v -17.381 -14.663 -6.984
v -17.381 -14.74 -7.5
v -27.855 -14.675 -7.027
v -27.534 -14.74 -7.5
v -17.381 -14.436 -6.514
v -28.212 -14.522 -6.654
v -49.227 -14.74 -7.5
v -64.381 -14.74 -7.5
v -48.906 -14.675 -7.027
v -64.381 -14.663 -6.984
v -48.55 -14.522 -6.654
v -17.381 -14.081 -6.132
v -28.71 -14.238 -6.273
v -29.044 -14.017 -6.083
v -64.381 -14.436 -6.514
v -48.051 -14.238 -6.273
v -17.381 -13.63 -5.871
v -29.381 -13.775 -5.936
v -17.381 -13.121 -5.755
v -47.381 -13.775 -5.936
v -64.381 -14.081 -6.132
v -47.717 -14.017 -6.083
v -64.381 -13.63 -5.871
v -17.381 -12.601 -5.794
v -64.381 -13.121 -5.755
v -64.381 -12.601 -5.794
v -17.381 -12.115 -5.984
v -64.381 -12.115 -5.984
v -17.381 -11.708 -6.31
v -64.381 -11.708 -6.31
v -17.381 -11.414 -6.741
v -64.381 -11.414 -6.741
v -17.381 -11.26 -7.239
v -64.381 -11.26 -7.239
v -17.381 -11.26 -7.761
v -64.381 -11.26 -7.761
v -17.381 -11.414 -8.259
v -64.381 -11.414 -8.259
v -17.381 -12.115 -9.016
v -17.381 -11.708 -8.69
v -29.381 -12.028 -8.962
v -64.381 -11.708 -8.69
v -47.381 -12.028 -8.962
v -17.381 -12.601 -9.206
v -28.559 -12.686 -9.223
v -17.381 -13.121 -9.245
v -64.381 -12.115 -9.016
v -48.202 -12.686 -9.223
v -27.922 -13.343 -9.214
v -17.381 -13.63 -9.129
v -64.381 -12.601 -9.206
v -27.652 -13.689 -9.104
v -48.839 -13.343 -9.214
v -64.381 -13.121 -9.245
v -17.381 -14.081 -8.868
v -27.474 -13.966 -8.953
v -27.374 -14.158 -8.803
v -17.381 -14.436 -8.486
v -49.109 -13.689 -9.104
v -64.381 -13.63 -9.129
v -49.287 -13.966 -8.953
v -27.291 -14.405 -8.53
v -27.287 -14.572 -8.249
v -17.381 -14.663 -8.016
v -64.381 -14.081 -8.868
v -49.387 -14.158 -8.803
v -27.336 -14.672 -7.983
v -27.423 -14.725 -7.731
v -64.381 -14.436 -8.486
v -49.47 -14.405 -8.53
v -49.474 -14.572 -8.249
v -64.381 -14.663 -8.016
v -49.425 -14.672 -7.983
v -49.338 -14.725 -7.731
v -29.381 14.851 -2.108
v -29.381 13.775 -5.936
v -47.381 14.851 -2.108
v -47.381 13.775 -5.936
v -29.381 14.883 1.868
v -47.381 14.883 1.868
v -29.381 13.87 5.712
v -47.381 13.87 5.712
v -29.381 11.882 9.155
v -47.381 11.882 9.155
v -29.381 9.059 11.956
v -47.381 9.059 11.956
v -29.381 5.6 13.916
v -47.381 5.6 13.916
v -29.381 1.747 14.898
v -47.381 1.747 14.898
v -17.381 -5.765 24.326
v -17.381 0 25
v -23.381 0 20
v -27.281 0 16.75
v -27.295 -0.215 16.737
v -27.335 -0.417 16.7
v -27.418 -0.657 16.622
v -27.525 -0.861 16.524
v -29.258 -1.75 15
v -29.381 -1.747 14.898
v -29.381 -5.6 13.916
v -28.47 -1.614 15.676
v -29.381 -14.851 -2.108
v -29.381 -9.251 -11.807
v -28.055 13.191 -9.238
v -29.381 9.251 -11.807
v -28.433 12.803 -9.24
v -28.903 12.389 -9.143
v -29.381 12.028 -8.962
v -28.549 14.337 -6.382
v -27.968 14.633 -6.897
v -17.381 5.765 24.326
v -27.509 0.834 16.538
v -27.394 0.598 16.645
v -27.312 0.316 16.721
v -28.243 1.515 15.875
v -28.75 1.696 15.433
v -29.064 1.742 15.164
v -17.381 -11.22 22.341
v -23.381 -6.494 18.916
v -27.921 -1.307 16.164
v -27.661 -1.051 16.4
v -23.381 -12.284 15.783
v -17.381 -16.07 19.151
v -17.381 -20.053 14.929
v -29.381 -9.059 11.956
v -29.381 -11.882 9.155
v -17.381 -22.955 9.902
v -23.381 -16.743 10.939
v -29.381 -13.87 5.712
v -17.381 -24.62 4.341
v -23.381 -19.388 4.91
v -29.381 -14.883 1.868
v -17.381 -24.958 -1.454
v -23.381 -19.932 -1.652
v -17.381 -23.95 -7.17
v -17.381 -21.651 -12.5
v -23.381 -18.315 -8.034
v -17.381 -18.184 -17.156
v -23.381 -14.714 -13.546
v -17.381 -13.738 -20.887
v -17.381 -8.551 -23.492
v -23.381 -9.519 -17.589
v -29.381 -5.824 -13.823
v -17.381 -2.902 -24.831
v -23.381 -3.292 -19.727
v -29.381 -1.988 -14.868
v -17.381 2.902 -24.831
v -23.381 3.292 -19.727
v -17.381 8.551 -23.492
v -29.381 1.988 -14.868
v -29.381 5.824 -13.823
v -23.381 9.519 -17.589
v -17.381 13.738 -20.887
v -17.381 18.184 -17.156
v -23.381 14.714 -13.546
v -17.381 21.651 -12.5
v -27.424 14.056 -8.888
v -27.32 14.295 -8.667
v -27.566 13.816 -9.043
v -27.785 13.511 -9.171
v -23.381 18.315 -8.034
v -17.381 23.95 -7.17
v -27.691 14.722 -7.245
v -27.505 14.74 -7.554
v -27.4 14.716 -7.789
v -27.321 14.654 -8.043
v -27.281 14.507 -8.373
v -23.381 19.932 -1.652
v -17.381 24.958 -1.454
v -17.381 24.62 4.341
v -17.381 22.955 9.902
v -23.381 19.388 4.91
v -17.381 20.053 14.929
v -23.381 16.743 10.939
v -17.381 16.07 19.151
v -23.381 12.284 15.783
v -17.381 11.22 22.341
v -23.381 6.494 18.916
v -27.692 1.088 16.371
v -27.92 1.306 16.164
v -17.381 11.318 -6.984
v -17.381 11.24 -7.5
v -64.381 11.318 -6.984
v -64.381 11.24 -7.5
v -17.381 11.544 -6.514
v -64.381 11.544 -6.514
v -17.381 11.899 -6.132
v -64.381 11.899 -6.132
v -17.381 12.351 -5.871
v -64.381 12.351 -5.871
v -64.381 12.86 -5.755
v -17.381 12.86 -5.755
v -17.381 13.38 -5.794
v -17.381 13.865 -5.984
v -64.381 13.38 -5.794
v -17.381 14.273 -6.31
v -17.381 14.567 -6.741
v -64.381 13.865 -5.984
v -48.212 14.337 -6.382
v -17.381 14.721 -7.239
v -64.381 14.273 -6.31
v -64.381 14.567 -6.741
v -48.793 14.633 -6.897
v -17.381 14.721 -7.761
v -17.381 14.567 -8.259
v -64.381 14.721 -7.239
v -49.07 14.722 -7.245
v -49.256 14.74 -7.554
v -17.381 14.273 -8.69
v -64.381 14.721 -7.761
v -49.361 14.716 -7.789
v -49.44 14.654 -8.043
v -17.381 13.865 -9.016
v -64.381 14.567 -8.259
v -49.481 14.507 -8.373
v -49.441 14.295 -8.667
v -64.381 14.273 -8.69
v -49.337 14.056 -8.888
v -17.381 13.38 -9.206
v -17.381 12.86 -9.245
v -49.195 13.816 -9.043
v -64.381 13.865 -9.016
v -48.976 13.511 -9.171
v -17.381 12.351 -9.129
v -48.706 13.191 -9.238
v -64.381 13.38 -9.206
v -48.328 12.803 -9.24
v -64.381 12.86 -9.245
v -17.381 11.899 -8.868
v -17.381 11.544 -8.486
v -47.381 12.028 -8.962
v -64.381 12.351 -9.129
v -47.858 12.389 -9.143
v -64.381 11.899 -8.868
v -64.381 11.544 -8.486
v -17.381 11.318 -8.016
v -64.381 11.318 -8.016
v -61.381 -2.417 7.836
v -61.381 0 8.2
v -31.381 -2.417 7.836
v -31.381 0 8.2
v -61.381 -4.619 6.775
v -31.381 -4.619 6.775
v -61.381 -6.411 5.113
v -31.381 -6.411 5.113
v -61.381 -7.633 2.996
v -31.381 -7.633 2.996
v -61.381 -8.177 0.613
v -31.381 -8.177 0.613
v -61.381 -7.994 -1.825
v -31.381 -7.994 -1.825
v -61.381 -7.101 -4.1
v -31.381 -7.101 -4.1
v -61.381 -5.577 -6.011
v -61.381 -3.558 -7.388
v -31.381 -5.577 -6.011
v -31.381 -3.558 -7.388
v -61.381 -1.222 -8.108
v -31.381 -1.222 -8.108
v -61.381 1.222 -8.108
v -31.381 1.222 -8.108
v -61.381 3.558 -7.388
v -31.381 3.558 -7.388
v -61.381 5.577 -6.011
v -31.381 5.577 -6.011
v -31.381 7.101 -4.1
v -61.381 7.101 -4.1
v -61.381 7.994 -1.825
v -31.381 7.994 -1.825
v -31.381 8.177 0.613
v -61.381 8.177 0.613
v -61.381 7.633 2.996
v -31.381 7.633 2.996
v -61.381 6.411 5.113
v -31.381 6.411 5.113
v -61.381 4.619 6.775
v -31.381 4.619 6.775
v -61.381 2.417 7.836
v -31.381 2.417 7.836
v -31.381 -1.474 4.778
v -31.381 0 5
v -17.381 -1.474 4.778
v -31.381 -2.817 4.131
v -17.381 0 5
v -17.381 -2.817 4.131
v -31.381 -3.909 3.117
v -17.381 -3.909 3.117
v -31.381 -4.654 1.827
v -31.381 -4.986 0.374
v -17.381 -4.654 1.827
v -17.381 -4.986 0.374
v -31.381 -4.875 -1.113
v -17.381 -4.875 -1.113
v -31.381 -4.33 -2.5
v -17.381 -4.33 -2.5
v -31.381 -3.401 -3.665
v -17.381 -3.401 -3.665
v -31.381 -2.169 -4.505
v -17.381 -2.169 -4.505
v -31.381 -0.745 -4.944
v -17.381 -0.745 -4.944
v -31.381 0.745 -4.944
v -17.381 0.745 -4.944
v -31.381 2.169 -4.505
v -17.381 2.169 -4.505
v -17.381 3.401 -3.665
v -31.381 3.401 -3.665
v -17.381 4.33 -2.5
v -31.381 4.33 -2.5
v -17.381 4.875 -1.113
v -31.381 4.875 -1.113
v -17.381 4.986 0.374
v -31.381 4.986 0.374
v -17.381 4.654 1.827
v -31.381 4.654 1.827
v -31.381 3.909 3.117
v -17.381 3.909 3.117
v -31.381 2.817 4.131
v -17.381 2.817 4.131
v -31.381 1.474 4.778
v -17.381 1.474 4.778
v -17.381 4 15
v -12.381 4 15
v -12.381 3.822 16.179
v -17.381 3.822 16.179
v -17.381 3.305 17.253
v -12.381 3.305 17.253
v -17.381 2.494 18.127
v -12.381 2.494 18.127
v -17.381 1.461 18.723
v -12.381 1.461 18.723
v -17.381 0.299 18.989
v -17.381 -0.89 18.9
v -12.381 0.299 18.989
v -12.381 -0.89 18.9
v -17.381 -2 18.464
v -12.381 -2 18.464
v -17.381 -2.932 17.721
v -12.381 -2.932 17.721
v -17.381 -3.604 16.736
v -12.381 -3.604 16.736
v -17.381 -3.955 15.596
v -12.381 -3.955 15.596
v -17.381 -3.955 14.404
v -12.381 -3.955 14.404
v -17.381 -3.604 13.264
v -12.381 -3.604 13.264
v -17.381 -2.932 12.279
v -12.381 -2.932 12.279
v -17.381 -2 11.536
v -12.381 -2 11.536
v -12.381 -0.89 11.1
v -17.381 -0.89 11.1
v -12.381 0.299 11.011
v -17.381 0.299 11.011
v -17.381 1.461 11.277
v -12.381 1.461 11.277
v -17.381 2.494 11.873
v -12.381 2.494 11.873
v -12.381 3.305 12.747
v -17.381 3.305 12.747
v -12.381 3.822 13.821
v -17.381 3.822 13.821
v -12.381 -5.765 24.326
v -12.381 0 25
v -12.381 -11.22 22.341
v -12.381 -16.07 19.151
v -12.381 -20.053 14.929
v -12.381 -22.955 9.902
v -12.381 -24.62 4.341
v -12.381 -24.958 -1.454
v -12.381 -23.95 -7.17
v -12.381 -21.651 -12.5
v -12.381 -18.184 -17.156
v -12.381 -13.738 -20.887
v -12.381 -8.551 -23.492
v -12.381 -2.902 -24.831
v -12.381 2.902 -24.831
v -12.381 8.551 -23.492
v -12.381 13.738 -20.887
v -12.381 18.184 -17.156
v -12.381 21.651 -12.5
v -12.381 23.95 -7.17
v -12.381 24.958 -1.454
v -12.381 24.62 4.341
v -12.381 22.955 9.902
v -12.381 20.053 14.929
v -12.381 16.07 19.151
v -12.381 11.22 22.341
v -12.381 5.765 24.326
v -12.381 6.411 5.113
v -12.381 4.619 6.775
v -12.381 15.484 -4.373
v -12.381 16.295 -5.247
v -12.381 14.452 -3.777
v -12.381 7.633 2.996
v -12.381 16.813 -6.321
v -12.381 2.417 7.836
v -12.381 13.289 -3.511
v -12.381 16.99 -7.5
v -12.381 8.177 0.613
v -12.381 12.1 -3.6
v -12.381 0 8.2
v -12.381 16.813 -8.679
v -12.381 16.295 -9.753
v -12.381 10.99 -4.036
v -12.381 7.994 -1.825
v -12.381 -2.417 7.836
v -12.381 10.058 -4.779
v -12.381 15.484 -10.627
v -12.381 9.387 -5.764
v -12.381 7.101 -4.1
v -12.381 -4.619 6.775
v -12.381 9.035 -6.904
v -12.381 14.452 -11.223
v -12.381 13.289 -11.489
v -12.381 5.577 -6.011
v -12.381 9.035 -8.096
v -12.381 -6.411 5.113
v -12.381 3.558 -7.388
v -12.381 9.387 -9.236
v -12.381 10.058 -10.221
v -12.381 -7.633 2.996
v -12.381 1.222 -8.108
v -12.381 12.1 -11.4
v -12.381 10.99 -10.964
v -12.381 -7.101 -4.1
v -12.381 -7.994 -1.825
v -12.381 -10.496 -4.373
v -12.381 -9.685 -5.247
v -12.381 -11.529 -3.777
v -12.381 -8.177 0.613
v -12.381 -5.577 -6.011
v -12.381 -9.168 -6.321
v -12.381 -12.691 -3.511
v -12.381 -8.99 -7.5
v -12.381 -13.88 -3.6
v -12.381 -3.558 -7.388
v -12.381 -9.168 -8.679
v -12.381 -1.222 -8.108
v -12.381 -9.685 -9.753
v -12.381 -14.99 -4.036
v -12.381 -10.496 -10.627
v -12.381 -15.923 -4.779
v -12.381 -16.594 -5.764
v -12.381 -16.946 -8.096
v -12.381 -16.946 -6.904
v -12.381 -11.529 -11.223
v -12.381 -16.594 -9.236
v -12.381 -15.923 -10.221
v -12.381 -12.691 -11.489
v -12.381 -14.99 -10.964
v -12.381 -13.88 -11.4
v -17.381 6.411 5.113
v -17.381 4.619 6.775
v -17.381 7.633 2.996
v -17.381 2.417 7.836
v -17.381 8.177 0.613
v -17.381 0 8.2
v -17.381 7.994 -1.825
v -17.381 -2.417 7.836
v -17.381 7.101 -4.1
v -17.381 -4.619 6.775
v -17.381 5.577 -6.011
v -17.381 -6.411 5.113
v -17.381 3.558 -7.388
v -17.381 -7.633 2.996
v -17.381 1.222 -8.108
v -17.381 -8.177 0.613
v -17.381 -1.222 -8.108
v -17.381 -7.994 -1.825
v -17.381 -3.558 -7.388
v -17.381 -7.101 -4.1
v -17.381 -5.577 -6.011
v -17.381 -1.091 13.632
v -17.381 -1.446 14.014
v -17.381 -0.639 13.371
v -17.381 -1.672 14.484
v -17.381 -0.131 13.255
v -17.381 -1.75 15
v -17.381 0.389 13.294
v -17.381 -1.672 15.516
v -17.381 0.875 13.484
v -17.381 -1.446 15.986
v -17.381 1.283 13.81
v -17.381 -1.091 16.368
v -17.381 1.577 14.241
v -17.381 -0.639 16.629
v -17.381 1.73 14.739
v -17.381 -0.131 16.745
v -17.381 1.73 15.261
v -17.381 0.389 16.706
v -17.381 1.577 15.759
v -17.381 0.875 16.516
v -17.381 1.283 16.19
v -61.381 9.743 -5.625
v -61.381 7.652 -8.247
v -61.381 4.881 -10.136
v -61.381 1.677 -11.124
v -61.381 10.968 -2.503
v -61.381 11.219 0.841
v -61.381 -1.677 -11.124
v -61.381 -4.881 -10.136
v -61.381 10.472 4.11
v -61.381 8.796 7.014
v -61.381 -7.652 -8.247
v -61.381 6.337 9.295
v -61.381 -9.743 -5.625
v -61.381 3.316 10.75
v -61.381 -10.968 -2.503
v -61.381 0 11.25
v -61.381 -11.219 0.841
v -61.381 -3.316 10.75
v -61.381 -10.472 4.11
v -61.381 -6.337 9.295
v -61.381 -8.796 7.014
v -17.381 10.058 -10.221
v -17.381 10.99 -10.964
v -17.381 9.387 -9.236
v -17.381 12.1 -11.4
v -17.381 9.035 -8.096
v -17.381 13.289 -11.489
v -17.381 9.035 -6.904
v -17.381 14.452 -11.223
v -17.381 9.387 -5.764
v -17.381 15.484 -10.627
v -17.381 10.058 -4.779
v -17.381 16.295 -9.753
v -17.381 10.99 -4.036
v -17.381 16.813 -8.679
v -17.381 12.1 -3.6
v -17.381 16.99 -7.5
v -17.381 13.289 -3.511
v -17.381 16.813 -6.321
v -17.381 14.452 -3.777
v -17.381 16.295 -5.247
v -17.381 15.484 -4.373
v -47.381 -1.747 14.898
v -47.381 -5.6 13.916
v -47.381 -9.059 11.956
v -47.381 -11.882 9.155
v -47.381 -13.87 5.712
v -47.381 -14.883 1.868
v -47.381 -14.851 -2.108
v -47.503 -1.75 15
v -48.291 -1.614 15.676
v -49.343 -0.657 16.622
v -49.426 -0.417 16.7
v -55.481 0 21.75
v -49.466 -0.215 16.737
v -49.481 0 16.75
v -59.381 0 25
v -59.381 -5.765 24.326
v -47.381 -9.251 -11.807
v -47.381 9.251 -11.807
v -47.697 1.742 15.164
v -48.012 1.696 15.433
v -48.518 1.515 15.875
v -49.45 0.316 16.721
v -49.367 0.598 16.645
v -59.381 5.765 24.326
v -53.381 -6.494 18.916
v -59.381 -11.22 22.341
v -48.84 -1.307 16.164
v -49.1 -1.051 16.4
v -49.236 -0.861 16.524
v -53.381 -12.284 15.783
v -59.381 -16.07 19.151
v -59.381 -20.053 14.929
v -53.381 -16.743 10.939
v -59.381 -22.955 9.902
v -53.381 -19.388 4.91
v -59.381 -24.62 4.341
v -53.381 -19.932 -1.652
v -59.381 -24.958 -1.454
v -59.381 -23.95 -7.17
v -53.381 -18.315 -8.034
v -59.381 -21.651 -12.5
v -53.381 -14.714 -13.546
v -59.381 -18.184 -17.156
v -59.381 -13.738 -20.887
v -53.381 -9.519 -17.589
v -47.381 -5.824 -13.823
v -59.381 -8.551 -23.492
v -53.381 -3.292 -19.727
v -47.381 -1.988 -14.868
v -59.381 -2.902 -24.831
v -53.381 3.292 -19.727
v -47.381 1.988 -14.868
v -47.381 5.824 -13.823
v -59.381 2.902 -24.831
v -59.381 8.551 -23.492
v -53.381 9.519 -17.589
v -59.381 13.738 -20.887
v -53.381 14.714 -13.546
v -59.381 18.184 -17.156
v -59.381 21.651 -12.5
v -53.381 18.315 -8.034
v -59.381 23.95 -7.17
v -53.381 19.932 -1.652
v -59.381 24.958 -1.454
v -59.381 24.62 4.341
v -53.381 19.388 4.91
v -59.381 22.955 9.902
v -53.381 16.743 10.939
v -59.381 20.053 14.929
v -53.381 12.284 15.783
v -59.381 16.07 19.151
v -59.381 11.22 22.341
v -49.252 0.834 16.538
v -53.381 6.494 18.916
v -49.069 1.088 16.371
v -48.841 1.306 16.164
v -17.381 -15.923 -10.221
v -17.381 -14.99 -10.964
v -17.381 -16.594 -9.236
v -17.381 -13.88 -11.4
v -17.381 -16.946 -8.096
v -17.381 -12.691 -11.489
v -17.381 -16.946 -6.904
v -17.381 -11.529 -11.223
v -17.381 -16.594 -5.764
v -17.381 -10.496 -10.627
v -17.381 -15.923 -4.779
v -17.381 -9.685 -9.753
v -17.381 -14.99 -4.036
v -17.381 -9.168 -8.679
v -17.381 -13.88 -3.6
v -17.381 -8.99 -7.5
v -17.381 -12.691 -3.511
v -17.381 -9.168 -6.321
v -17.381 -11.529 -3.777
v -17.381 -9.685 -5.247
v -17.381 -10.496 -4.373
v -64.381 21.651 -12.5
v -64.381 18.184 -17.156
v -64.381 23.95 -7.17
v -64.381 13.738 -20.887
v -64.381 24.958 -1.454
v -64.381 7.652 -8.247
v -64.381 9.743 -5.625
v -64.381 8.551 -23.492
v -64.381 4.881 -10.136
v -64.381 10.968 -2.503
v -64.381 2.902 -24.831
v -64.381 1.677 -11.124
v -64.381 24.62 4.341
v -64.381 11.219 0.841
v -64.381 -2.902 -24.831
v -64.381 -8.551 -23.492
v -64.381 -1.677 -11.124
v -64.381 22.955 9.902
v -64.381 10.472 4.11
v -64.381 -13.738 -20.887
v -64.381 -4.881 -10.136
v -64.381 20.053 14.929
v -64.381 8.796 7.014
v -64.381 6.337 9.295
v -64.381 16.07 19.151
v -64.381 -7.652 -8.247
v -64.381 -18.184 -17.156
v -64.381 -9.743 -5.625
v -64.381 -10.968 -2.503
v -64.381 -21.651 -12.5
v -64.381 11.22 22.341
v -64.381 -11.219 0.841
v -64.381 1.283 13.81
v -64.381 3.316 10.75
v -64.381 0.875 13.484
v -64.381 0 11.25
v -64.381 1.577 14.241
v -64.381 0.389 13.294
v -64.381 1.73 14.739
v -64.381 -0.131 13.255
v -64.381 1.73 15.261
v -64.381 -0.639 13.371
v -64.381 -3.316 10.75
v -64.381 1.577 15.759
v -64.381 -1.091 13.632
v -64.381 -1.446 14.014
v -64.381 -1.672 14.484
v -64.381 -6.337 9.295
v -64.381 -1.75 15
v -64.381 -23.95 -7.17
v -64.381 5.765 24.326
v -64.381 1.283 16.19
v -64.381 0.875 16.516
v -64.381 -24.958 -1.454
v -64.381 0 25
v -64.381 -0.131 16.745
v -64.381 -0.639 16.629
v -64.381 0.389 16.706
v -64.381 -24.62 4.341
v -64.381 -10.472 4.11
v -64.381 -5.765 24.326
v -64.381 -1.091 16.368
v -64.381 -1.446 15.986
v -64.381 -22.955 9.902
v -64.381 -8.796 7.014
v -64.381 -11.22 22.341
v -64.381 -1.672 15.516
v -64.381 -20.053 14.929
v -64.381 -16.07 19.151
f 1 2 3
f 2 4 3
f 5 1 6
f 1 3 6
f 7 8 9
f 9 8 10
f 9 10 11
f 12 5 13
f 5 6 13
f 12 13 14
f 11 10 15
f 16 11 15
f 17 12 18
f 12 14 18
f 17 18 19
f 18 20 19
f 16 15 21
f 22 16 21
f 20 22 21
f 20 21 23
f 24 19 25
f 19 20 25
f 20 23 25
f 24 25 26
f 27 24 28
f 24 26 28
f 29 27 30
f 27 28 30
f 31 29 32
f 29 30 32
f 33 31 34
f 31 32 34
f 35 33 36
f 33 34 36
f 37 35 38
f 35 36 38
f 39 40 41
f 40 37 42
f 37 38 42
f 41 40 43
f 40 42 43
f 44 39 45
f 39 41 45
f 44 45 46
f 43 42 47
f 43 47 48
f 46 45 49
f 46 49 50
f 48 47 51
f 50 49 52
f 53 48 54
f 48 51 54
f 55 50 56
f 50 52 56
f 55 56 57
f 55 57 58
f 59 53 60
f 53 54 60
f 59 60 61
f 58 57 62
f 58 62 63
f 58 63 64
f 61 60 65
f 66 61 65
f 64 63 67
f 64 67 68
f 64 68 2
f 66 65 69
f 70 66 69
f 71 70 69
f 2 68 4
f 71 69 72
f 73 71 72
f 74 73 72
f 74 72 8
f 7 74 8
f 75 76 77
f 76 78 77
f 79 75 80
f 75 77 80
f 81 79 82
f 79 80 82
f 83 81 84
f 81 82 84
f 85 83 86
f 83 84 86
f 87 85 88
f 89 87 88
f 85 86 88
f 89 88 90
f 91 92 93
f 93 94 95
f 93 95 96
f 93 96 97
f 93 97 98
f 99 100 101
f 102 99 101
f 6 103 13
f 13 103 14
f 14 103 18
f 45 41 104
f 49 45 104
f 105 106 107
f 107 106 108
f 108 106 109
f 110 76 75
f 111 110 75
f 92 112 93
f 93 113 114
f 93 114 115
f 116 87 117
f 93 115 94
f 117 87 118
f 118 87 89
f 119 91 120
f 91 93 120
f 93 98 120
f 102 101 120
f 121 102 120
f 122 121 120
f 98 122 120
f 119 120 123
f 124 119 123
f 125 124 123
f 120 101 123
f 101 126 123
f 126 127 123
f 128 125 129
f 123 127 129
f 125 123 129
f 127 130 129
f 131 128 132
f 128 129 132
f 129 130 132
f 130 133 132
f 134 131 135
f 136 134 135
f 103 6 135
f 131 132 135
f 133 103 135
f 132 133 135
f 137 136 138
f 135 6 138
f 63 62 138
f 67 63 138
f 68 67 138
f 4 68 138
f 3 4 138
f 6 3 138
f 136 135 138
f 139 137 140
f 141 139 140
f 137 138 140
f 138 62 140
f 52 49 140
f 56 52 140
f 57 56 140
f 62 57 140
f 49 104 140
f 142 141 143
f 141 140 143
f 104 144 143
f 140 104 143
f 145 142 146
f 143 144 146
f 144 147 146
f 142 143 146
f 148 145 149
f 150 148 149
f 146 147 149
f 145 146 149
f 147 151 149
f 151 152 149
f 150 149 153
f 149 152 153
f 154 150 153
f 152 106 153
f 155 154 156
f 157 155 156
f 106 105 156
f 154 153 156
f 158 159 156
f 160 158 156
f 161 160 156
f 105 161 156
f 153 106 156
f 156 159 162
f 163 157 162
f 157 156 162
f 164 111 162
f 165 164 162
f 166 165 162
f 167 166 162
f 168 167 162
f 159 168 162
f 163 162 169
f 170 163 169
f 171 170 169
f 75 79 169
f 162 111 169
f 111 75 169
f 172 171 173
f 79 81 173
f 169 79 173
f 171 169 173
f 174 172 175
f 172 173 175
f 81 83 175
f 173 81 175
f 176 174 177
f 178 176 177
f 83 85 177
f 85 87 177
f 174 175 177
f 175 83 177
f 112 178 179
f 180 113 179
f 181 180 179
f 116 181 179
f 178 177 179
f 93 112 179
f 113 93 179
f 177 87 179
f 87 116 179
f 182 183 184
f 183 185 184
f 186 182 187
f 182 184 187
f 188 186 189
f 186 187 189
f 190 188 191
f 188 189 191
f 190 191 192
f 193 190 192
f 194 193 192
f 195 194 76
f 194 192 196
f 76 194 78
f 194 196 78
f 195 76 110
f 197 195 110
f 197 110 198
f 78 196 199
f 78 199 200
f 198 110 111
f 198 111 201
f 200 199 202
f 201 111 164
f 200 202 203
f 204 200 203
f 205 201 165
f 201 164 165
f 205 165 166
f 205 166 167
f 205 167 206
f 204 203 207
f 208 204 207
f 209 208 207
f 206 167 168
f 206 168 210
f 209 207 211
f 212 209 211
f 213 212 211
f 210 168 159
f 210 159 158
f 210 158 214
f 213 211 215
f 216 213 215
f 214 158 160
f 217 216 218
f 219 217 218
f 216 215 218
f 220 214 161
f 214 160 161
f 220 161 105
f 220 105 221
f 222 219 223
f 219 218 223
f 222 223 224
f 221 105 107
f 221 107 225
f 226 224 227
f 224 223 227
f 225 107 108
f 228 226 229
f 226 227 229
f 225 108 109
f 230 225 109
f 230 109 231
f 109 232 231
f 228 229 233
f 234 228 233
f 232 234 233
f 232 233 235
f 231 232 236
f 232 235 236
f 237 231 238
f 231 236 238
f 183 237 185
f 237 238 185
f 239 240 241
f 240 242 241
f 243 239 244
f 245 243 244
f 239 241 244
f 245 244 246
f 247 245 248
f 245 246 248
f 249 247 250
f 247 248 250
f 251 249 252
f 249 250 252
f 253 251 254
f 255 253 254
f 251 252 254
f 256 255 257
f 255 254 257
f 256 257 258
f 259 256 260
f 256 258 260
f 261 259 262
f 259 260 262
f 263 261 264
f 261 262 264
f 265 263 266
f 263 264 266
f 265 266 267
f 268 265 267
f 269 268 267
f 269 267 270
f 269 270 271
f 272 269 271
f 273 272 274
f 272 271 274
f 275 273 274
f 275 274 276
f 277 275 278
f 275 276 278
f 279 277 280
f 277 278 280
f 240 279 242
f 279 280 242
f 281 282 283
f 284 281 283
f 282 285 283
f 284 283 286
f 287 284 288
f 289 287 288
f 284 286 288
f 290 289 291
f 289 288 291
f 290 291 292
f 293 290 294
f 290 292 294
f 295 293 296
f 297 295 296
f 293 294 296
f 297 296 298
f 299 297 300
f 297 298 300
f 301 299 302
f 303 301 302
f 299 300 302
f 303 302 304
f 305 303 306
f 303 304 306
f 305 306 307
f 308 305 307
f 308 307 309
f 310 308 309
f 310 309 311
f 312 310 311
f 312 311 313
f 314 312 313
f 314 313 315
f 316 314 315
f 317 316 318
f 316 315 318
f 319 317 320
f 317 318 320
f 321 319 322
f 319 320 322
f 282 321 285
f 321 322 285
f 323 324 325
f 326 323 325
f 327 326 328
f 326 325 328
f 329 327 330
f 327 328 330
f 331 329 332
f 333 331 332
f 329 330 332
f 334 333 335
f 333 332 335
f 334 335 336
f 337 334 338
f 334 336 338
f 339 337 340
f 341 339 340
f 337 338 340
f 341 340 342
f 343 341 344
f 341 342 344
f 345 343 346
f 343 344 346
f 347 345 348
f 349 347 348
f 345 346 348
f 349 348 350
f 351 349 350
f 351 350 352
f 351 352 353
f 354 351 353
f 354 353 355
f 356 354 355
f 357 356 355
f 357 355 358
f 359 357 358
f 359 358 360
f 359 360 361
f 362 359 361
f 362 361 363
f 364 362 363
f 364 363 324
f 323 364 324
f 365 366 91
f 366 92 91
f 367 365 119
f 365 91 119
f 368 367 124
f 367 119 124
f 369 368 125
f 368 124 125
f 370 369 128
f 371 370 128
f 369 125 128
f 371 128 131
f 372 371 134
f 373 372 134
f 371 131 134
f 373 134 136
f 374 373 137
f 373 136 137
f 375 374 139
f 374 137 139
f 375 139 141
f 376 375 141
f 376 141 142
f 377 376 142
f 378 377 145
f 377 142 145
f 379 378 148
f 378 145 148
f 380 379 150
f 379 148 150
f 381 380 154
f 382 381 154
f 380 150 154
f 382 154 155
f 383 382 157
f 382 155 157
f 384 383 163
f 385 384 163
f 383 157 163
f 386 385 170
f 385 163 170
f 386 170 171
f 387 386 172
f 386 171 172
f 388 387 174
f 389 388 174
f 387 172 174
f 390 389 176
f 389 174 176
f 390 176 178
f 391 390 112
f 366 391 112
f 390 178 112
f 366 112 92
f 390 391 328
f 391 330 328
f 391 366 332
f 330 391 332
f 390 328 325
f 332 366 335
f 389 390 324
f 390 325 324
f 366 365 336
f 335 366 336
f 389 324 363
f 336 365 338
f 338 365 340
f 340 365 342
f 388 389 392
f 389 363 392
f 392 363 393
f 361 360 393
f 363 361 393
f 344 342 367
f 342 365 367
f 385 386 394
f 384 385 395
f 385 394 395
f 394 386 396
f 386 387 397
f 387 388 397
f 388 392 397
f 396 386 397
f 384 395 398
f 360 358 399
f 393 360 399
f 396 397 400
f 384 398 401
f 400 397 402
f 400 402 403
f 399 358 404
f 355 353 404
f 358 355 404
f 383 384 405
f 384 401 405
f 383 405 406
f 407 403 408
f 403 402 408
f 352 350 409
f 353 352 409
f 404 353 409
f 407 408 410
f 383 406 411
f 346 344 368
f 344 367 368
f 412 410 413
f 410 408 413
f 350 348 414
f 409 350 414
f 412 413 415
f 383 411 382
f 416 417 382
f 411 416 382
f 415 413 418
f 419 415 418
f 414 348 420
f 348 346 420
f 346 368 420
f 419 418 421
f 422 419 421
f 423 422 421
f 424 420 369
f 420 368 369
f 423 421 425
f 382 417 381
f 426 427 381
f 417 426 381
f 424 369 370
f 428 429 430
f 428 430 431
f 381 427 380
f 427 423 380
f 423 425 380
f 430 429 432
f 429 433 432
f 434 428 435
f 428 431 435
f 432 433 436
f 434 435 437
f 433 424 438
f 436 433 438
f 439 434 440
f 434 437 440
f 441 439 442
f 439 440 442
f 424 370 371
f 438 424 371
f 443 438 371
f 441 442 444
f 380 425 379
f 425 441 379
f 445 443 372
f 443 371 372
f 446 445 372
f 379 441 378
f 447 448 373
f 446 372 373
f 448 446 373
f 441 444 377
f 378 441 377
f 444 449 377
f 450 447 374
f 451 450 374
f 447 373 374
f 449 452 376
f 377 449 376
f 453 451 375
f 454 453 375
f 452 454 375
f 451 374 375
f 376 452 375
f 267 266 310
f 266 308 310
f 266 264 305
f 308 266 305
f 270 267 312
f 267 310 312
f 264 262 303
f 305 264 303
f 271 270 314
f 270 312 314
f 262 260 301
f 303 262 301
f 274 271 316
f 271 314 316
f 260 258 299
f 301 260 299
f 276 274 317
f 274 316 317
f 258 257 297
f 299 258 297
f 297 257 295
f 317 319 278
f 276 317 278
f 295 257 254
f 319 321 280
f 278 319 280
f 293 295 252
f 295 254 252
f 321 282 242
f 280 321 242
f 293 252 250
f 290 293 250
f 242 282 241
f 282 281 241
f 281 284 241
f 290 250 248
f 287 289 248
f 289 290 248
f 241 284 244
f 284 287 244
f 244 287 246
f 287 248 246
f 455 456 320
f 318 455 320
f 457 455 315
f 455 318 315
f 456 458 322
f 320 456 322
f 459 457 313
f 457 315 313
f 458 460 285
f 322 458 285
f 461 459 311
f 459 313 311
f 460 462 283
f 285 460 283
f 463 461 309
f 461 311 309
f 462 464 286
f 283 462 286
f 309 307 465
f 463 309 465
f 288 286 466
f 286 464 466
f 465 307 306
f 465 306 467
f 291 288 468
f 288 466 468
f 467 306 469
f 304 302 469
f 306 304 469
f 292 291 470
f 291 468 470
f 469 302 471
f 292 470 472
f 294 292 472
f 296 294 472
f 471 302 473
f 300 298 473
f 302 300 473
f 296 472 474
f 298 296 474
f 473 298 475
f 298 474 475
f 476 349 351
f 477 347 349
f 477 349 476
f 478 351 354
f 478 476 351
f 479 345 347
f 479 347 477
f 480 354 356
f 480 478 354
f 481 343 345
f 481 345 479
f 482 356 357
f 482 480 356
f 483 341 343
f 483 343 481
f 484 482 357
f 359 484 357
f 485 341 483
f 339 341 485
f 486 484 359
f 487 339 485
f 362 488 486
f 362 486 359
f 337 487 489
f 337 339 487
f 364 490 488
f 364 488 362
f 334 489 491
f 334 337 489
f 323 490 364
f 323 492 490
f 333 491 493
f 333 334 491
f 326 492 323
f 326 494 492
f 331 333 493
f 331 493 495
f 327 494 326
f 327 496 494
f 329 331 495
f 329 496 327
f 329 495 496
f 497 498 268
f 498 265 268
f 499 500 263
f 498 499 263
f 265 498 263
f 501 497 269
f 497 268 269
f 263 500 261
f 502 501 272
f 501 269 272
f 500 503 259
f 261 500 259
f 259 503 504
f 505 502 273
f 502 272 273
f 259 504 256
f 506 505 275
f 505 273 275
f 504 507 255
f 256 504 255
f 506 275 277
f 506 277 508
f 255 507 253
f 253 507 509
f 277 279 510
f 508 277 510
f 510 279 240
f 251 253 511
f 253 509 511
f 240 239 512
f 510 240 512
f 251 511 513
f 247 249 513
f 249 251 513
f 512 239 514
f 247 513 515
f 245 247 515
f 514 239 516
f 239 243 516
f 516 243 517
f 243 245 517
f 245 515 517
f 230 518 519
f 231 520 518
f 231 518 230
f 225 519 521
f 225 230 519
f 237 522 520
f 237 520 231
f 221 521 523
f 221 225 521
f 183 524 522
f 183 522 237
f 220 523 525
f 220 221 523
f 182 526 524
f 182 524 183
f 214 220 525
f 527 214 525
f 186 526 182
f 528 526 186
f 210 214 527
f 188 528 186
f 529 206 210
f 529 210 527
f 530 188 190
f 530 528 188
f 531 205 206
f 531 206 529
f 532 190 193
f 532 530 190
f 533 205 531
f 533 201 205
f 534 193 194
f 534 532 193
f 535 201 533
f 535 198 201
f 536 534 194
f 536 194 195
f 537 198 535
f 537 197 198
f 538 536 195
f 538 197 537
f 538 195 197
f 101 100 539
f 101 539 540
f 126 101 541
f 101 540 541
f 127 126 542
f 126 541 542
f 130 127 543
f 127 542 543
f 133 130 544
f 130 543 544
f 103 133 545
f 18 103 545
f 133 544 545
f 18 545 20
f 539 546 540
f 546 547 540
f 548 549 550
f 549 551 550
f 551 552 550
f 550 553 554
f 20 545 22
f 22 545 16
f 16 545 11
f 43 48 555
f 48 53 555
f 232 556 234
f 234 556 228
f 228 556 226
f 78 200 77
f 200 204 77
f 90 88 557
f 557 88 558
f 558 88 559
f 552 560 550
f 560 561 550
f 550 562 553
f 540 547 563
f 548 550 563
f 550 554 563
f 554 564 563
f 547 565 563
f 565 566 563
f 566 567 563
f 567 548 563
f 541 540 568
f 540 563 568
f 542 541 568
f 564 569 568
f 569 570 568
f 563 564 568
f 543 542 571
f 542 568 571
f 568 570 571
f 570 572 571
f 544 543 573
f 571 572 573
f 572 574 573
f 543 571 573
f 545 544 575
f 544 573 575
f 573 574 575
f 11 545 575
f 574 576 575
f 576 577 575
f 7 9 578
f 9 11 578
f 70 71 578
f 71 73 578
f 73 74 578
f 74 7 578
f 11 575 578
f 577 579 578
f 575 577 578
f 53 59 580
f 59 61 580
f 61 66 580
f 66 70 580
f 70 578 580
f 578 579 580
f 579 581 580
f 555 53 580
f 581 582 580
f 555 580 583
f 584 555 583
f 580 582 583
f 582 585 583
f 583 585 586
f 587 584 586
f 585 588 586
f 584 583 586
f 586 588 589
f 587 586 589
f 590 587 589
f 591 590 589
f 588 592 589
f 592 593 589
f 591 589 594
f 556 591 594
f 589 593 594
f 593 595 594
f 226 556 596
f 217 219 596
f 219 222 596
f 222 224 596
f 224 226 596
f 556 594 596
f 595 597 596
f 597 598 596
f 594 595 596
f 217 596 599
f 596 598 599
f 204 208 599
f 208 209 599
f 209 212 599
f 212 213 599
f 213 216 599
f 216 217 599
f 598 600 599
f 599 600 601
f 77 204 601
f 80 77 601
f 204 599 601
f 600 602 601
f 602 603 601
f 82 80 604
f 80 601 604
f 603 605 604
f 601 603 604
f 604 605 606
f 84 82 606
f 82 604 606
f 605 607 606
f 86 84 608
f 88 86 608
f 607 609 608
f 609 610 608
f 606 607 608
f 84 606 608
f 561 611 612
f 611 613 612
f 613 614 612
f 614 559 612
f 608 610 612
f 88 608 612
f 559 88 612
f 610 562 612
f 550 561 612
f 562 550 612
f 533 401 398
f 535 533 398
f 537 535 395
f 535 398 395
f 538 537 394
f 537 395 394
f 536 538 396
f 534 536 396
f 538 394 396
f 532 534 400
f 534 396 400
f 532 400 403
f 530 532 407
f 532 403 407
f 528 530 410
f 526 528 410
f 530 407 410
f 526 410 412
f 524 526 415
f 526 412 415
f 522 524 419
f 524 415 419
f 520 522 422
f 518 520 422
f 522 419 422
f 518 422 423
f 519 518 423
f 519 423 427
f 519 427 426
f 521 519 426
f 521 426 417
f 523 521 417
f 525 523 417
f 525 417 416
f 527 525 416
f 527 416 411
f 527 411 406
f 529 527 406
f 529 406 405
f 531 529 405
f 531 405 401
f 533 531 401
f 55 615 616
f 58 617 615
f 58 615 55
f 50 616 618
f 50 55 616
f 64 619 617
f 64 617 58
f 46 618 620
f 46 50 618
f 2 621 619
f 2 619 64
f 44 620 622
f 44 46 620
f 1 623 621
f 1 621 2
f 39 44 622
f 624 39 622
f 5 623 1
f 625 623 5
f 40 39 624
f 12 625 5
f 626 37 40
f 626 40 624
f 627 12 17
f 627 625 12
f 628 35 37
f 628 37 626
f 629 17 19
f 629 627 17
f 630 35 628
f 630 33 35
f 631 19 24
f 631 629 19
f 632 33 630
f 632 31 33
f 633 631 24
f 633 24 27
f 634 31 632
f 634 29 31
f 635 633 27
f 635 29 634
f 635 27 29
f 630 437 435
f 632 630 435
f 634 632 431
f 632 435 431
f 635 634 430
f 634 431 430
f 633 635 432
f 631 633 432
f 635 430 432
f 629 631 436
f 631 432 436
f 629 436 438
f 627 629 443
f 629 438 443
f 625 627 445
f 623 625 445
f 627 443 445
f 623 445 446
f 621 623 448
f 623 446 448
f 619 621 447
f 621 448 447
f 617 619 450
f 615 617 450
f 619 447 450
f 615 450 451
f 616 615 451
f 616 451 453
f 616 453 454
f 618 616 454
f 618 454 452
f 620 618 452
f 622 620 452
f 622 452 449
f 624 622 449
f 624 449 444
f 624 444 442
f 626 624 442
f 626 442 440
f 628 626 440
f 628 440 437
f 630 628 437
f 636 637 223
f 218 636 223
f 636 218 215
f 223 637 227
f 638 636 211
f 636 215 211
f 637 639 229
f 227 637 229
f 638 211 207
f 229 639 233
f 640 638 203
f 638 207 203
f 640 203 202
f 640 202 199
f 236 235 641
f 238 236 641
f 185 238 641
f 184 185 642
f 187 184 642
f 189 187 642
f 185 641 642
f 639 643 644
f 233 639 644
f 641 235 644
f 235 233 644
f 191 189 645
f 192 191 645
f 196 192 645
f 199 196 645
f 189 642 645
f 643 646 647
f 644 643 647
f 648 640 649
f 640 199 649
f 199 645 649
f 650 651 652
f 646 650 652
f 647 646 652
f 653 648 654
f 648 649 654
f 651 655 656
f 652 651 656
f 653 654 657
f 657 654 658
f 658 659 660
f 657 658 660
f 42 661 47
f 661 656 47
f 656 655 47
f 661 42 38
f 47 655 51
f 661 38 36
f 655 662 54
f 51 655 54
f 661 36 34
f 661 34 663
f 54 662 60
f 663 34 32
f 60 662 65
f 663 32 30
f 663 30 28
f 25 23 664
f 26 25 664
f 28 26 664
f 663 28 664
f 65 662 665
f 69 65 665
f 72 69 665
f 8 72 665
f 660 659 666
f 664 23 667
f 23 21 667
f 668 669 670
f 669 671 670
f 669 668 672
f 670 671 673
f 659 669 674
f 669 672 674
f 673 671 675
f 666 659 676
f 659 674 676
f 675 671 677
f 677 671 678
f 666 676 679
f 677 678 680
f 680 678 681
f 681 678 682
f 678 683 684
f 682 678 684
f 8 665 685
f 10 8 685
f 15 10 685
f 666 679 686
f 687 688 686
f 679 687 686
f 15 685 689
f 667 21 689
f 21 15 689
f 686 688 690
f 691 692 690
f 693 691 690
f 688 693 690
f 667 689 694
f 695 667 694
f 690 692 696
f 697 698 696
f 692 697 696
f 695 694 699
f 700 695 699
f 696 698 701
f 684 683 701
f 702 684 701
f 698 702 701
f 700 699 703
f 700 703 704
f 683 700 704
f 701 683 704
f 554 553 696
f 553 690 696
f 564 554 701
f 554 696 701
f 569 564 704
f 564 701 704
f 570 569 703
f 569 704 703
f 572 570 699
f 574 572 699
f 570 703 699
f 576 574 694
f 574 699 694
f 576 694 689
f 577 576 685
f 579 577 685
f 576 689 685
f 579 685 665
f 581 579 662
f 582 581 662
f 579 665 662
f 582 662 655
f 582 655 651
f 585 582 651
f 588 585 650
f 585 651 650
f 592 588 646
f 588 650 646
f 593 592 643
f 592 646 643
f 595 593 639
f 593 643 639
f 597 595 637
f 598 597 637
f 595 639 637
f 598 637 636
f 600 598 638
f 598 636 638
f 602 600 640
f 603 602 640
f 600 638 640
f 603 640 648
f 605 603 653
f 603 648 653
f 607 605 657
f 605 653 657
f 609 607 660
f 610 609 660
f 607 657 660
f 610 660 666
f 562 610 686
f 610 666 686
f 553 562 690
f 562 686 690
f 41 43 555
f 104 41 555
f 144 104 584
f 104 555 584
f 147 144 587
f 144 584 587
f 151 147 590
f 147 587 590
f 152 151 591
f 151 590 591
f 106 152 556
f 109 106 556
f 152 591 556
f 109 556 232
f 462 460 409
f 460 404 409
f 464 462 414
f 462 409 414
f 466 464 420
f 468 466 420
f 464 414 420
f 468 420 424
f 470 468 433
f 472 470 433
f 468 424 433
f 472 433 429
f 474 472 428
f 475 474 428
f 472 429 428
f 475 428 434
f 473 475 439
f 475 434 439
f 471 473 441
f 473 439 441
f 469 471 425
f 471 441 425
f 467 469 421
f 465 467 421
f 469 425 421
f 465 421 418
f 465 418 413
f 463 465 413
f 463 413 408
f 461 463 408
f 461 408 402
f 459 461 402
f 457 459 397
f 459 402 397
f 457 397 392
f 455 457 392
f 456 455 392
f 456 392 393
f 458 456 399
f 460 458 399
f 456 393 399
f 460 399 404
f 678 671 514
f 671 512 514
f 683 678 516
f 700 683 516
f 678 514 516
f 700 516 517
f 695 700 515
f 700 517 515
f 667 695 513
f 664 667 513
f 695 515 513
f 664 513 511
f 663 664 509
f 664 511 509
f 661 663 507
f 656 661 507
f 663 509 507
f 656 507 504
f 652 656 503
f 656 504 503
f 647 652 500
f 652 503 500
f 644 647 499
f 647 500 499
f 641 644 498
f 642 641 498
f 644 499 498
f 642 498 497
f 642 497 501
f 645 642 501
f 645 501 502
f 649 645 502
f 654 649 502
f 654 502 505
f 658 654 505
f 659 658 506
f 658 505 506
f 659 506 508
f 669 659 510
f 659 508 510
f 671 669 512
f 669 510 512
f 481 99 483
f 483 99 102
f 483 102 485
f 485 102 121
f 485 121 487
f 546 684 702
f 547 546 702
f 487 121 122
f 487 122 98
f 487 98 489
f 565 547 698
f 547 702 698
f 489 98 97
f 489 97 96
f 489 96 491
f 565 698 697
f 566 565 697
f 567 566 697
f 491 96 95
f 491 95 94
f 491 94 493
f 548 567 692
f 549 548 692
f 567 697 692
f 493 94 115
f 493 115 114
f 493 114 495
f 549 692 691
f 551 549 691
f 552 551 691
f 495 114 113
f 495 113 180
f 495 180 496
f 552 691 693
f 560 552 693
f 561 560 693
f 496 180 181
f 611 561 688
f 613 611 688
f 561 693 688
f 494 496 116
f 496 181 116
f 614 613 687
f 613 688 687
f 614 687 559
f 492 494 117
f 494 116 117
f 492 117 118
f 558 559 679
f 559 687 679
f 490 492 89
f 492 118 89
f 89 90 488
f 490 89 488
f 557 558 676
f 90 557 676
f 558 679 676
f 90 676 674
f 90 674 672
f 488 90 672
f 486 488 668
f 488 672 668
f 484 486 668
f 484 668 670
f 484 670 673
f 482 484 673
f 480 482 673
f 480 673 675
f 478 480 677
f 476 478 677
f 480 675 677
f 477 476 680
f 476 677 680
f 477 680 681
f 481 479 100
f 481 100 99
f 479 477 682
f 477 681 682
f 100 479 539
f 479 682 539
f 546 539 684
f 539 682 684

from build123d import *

# Parameters (mm, degrees)
F3_D           = 3.5
F3_START       = 12.3805311
F3_CBORE_D     = 8
F3_CBORE_DEPTH = 5


with BuildPart() as f1:
    # F0 (on Front) → F1 (revolve)
    with BuildSketch(Plane.XZ):
        Polygon((-12.3805310677, 8.2), (-12.3805310677, 25), (-17.3805310677, 25), (-29.3805310677, 15), (-47.3805310677, 15), (-59.3805310677, 25), (-64.3805310677, 25), (-64.3805310677, 11.25), (-61.3805310677, 11.25), (-61.3805310677, 8.2), (-31.3805310677, 8.2), (-31.3805310677, 5), (-17.3805310677, 5), (-17.3805310677, 8.2), align=None)
    revolve(axis=Axis((6.6371694137, 0, 0), (1, 0, 0)))

    # F3 (through all)
    # its depths count from where the whole tool has entered the part; down to there all is cleared
    with Locations(Plane.YZ.offset(-F3_START)):
        with Locations((0, 15), (-12.9903810568, -7.5), (12.9903810568, -7.5)):
            CounterBoreHole(F3_D / 2, F3_CBORE_D / 2, F3_CBORE_DEPTH)


solid = f1.part
